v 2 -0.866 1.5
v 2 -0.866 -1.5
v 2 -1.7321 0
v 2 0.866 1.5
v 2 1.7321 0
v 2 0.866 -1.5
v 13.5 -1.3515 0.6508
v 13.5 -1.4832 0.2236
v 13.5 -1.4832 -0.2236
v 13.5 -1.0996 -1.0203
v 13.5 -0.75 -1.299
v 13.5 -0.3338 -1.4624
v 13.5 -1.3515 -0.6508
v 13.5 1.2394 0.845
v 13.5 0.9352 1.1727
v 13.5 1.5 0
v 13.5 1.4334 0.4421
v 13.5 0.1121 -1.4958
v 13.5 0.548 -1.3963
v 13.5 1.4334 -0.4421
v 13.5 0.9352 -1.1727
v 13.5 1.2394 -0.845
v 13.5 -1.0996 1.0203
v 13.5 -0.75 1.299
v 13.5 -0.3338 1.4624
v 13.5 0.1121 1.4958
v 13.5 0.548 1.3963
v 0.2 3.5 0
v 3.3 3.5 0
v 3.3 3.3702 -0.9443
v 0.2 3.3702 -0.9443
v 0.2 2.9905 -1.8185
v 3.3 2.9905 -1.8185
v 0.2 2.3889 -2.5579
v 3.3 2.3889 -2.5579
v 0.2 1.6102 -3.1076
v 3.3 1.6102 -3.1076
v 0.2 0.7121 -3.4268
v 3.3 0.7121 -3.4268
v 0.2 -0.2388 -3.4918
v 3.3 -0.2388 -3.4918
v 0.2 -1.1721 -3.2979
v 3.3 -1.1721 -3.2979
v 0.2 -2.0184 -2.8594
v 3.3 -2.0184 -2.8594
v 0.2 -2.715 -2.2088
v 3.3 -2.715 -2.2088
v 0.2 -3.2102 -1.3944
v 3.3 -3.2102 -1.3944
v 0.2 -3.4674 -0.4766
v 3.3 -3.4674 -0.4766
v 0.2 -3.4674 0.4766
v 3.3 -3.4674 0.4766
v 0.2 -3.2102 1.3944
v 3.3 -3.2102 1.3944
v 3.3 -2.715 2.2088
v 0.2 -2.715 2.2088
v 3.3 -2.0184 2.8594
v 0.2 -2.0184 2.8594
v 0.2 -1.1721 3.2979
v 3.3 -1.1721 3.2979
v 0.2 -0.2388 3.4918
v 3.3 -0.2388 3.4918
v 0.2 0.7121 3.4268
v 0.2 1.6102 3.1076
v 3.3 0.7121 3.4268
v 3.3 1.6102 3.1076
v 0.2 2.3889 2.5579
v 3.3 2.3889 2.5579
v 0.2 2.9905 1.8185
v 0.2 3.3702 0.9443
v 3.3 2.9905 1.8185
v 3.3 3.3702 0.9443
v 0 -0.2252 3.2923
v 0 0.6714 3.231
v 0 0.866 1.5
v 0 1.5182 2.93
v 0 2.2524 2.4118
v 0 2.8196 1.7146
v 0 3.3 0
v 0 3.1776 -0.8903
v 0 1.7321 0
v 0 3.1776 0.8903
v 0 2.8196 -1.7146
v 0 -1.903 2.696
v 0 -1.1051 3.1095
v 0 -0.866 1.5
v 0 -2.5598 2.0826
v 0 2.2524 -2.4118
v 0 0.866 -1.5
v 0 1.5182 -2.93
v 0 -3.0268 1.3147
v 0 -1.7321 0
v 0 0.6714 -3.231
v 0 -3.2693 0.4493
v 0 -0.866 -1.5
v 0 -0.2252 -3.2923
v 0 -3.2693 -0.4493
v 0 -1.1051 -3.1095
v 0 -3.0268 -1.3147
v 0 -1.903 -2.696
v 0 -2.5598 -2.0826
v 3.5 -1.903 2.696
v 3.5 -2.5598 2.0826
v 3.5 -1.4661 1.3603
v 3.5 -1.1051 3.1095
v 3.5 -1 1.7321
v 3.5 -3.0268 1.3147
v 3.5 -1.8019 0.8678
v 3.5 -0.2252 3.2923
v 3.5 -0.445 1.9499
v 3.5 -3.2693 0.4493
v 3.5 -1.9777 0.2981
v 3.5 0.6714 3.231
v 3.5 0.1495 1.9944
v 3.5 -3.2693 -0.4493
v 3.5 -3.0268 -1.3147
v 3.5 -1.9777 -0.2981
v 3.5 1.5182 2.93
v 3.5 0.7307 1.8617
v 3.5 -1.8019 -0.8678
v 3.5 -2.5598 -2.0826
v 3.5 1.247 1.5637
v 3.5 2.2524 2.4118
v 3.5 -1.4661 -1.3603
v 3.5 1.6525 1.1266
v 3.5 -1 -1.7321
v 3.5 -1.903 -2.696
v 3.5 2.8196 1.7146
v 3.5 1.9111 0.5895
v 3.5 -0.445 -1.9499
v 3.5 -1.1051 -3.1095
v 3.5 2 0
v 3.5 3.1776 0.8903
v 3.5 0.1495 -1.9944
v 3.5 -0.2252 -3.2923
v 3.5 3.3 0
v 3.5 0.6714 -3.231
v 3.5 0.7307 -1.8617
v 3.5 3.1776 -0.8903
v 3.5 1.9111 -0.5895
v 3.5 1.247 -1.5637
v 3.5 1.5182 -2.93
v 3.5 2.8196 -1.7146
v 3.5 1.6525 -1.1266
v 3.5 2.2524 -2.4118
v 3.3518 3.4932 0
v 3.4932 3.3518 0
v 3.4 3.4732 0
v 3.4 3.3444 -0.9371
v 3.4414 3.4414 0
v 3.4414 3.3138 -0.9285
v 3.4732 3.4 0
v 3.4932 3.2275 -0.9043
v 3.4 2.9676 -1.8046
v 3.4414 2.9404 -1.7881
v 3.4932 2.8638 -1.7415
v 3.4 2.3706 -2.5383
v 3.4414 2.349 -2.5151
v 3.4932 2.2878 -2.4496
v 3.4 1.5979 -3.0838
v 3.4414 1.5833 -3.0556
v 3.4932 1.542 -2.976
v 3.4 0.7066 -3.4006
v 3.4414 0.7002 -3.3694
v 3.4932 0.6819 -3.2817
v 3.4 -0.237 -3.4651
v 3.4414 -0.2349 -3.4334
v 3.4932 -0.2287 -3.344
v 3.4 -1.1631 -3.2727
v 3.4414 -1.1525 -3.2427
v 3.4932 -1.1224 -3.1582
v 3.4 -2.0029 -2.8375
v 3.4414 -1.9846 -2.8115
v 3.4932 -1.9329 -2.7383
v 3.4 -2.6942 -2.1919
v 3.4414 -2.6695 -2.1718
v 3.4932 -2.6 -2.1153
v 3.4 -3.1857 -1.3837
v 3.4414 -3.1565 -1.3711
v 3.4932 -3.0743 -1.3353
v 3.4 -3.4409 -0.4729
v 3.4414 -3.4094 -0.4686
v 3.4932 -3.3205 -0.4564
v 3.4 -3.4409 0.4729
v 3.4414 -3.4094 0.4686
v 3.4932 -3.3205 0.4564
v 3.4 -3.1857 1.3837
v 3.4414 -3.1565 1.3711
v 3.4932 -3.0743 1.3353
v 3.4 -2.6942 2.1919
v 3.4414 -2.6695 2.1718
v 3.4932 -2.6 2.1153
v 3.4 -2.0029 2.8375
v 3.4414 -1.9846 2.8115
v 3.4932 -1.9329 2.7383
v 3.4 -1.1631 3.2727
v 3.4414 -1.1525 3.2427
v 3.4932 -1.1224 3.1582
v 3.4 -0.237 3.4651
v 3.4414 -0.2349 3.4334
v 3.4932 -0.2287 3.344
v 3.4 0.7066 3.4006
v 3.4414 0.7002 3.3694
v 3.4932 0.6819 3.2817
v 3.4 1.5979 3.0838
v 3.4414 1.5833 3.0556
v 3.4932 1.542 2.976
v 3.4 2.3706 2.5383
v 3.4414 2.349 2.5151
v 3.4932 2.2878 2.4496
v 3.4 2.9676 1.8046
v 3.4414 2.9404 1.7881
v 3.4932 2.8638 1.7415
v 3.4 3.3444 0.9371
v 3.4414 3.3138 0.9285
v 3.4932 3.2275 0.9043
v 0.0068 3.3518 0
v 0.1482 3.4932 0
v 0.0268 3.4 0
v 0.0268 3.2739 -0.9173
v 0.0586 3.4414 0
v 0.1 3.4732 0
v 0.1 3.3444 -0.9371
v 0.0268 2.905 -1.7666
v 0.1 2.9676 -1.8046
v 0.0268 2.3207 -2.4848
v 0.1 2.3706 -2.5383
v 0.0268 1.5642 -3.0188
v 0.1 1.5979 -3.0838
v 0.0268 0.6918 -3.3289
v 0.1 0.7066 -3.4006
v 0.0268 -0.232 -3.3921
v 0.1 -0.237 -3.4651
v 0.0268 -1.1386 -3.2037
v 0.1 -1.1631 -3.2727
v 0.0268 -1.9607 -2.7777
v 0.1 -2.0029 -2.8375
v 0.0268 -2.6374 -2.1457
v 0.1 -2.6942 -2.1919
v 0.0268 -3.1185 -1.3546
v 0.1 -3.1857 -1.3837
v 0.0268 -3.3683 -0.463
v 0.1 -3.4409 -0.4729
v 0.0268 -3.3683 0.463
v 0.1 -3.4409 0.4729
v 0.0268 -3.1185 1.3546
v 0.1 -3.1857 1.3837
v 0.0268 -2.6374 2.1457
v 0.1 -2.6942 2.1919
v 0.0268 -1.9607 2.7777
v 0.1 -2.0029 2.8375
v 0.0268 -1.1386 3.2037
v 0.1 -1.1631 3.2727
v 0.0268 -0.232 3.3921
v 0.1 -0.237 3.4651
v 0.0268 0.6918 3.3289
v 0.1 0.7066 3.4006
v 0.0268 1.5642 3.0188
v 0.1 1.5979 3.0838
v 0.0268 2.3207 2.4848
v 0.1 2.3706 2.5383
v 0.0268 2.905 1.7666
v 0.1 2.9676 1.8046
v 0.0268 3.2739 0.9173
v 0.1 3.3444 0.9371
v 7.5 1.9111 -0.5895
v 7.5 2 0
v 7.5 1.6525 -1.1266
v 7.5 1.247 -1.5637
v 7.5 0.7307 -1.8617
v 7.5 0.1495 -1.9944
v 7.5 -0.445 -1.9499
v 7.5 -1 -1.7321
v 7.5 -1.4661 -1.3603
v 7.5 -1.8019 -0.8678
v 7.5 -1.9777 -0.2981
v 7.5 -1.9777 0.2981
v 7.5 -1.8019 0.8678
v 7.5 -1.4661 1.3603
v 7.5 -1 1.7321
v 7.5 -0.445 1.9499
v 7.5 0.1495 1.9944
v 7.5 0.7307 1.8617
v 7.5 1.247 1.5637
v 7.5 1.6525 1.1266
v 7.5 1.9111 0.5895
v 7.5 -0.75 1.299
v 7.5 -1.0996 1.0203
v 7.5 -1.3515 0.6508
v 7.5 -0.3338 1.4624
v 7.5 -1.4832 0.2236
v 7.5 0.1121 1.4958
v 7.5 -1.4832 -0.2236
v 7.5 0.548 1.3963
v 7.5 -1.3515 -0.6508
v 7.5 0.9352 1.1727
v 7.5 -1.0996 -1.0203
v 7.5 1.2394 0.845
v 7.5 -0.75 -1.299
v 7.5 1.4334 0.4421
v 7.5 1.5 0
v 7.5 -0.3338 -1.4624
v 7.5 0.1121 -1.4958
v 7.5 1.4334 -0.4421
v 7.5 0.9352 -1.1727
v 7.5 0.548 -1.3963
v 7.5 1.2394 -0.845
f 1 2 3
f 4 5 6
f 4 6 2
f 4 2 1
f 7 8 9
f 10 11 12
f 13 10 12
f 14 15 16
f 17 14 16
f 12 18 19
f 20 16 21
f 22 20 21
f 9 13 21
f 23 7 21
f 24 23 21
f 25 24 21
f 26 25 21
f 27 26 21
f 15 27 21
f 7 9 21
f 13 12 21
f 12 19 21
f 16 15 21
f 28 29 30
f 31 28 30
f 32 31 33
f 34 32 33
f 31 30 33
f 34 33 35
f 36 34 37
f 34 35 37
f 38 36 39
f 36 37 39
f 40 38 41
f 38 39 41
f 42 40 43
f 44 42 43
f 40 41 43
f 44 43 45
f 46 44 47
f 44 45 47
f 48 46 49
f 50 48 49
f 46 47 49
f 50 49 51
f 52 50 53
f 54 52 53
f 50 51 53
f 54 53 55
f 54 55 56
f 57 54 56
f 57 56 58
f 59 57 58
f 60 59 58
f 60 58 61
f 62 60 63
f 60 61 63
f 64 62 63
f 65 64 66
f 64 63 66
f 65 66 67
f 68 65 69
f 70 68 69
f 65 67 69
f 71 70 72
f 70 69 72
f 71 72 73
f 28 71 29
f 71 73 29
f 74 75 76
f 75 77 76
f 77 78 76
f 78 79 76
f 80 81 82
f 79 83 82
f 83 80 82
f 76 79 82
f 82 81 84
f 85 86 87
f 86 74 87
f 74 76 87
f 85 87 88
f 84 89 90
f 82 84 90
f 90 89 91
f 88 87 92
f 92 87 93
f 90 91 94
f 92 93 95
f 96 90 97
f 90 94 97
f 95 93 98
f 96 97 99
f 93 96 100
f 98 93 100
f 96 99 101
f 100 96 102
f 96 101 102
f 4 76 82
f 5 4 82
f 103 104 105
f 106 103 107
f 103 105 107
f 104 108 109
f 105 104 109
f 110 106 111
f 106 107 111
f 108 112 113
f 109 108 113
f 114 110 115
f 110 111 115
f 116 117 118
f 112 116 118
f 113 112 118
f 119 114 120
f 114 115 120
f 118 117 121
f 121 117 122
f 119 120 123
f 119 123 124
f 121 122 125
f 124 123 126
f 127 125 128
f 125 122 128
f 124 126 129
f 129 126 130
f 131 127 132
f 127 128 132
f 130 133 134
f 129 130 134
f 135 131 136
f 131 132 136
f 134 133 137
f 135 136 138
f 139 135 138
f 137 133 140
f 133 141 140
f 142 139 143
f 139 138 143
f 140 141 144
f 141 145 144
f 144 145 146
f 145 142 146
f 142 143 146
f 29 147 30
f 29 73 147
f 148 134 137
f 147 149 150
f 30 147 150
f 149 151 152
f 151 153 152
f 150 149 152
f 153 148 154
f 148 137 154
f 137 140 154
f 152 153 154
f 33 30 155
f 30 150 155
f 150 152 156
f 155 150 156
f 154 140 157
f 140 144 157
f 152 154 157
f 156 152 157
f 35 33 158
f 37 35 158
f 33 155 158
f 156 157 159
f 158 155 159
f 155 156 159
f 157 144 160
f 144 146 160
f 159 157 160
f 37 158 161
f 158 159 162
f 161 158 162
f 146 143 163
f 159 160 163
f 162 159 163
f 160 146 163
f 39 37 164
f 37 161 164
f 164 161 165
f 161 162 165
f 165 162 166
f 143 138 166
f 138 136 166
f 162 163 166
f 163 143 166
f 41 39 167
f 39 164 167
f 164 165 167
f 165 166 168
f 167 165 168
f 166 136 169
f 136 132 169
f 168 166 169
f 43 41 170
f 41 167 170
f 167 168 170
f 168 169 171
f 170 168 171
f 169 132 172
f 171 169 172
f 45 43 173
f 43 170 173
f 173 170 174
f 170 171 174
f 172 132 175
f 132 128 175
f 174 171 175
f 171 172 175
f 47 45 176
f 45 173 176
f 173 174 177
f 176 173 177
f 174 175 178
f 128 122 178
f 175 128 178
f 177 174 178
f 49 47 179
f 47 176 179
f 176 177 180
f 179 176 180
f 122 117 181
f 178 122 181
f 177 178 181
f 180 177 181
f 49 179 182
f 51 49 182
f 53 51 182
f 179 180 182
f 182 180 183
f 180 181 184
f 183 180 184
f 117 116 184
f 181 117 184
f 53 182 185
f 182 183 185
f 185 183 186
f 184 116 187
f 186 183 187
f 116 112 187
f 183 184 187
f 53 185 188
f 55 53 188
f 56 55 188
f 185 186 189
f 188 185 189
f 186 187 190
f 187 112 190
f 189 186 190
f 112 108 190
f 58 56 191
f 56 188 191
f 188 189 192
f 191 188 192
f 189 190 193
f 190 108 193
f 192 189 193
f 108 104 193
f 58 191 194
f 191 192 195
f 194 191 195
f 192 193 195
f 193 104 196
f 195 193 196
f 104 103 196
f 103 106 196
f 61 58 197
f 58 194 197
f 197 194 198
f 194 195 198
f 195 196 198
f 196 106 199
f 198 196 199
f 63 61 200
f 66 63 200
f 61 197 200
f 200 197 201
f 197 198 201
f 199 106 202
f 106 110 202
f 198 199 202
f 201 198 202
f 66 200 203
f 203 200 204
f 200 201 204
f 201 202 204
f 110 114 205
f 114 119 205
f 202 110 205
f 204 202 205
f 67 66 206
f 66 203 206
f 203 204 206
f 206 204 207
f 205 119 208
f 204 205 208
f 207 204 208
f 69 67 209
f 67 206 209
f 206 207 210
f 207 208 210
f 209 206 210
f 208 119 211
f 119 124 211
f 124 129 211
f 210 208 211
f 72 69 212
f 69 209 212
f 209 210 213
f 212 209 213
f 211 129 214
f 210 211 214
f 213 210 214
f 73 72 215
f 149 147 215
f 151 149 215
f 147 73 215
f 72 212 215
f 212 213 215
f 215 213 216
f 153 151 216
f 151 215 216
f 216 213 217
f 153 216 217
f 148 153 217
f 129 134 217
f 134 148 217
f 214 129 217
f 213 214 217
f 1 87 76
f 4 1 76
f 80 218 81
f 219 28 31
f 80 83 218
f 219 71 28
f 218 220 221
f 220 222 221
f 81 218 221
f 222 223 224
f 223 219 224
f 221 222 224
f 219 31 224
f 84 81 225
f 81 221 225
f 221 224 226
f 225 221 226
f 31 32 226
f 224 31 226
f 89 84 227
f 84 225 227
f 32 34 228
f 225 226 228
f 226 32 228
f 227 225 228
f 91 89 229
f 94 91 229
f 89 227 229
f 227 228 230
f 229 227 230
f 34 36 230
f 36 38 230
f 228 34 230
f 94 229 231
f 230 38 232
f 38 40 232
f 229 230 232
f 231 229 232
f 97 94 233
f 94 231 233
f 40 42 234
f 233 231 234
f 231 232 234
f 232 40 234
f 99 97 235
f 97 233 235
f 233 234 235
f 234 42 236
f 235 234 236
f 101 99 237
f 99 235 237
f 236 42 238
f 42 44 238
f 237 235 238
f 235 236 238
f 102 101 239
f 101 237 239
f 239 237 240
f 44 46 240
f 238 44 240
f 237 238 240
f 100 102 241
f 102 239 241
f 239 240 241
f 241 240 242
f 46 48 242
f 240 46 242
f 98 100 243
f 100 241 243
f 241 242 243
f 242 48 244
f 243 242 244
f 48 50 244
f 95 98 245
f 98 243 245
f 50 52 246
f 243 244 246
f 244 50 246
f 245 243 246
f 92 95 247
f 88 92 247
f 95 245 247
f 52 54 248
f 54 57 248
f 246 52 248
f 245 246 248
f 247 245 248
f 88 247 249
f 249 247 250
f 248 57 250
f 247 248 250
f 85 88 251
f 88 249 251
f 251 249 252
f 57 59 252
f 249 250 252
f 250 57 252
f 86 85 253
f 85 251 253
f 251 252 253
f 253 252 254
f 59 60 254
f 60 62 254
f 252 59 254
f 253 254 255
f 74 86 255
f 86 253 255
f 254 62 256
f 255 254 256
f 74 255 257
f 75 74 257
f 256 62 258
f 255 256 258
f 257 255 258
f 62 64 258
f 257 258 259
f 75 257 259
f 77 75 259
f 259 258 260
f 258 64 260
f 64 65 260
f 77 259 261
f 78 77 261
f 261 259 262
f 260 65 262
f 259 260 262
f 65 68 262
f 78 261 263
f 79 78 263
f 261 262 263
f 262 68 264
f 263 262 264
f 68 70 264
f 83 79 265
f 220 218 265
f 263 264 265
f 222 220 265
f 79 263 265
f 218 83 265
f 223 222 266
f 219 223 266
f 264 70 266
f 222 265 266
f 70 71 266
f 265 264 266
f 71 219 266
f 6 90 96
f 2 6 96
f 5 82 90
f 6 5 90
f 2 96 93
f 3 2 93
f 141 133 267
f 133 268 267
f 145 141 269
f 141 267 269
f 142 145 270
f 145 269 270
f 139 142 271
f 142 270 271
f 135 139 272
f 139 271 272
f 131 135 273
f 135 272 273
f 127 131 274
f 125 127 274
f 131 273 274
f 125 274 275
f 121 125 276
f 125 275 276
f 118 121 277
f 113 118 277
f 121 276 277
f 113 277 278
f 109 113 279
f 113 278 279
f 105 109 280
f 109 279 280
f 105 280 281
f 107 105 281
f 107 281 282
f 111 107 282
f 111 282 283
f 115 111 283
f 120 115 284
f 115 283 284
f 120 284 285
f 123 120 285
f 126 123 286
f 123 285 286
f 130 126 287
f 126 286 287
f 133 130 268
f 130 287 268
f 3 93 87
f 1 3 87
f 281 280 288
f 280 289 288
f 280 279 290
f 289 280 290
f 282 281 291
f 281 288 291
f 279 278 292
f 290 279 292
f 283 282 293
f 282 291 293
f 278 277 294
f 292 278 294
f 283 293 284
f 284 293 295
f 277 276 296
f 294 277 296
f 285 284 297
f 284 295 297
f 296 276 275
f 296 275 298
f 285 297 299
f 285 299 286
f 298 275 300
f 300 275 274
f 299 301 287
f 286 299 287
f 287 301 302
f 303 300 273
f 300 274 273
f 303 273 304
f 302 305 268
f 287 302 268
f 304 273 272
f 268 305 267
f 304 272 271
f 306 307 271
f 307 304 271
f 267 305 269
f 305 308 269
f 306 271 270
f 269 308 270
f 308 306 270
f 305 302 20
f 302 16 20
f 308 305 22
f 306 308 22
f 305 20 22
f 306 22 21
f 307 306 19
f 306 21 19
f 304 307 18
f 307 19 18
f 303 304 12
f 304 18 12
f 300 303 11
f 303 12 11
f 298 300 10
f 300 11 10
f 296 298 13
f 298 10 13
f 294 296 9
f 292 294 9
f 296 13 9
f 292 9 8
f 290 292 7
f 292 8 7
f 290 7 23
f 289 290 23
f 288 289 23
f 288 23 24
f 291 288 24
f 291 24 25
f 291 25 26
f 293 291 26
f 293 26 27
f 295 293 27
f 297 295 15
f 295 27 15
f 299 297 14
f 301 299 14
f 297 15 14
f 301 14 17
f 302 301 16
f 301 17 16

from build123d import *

# Parameters (mm, degrees)
CUT_EXTRUDE_1_DEPTH = 2
FILLET_1_R          = 0.2


with BuildPart() as part:
    # 草图1 → 旋转1 (revolve)
    with BuildSketch(Plane.XY):
        Polygon((0, 0), (0, 3.5), (3.5, 3.5), (3.5, 2), (7.5, 2), (7.5, 1.5), (13.5, 1.5), (13.5, 0), align=None)
    revolve(axis=Axis((13.5, 0, 0), (-1, 0, 0)))

    # 草图2 → 切除-拉伸1 (cut)
    with BuildSketch(Plane.ZY):
        Polygon((1.5, 0.866025404), (0, 1.732050808), (-1.5, 0.866025404), (-1.5, -0.866025404), (0, -1.732050808), (1.5, -0.866025404), align=None)
    extrude(amount=-CUT_EXTRUDE_1_DEPTH, mode=Mode.SUBTRACT)

    # 圆角1
    fillet_1_edges = [part.edges().sort_by_distance(p)[0] for p in [
        (3.5, -3.5, 0),
        (0, -3.5, 0),
    ]]
    fillet(fillet_1_edges, radius=FILLET_1_R)


solid = part.part
